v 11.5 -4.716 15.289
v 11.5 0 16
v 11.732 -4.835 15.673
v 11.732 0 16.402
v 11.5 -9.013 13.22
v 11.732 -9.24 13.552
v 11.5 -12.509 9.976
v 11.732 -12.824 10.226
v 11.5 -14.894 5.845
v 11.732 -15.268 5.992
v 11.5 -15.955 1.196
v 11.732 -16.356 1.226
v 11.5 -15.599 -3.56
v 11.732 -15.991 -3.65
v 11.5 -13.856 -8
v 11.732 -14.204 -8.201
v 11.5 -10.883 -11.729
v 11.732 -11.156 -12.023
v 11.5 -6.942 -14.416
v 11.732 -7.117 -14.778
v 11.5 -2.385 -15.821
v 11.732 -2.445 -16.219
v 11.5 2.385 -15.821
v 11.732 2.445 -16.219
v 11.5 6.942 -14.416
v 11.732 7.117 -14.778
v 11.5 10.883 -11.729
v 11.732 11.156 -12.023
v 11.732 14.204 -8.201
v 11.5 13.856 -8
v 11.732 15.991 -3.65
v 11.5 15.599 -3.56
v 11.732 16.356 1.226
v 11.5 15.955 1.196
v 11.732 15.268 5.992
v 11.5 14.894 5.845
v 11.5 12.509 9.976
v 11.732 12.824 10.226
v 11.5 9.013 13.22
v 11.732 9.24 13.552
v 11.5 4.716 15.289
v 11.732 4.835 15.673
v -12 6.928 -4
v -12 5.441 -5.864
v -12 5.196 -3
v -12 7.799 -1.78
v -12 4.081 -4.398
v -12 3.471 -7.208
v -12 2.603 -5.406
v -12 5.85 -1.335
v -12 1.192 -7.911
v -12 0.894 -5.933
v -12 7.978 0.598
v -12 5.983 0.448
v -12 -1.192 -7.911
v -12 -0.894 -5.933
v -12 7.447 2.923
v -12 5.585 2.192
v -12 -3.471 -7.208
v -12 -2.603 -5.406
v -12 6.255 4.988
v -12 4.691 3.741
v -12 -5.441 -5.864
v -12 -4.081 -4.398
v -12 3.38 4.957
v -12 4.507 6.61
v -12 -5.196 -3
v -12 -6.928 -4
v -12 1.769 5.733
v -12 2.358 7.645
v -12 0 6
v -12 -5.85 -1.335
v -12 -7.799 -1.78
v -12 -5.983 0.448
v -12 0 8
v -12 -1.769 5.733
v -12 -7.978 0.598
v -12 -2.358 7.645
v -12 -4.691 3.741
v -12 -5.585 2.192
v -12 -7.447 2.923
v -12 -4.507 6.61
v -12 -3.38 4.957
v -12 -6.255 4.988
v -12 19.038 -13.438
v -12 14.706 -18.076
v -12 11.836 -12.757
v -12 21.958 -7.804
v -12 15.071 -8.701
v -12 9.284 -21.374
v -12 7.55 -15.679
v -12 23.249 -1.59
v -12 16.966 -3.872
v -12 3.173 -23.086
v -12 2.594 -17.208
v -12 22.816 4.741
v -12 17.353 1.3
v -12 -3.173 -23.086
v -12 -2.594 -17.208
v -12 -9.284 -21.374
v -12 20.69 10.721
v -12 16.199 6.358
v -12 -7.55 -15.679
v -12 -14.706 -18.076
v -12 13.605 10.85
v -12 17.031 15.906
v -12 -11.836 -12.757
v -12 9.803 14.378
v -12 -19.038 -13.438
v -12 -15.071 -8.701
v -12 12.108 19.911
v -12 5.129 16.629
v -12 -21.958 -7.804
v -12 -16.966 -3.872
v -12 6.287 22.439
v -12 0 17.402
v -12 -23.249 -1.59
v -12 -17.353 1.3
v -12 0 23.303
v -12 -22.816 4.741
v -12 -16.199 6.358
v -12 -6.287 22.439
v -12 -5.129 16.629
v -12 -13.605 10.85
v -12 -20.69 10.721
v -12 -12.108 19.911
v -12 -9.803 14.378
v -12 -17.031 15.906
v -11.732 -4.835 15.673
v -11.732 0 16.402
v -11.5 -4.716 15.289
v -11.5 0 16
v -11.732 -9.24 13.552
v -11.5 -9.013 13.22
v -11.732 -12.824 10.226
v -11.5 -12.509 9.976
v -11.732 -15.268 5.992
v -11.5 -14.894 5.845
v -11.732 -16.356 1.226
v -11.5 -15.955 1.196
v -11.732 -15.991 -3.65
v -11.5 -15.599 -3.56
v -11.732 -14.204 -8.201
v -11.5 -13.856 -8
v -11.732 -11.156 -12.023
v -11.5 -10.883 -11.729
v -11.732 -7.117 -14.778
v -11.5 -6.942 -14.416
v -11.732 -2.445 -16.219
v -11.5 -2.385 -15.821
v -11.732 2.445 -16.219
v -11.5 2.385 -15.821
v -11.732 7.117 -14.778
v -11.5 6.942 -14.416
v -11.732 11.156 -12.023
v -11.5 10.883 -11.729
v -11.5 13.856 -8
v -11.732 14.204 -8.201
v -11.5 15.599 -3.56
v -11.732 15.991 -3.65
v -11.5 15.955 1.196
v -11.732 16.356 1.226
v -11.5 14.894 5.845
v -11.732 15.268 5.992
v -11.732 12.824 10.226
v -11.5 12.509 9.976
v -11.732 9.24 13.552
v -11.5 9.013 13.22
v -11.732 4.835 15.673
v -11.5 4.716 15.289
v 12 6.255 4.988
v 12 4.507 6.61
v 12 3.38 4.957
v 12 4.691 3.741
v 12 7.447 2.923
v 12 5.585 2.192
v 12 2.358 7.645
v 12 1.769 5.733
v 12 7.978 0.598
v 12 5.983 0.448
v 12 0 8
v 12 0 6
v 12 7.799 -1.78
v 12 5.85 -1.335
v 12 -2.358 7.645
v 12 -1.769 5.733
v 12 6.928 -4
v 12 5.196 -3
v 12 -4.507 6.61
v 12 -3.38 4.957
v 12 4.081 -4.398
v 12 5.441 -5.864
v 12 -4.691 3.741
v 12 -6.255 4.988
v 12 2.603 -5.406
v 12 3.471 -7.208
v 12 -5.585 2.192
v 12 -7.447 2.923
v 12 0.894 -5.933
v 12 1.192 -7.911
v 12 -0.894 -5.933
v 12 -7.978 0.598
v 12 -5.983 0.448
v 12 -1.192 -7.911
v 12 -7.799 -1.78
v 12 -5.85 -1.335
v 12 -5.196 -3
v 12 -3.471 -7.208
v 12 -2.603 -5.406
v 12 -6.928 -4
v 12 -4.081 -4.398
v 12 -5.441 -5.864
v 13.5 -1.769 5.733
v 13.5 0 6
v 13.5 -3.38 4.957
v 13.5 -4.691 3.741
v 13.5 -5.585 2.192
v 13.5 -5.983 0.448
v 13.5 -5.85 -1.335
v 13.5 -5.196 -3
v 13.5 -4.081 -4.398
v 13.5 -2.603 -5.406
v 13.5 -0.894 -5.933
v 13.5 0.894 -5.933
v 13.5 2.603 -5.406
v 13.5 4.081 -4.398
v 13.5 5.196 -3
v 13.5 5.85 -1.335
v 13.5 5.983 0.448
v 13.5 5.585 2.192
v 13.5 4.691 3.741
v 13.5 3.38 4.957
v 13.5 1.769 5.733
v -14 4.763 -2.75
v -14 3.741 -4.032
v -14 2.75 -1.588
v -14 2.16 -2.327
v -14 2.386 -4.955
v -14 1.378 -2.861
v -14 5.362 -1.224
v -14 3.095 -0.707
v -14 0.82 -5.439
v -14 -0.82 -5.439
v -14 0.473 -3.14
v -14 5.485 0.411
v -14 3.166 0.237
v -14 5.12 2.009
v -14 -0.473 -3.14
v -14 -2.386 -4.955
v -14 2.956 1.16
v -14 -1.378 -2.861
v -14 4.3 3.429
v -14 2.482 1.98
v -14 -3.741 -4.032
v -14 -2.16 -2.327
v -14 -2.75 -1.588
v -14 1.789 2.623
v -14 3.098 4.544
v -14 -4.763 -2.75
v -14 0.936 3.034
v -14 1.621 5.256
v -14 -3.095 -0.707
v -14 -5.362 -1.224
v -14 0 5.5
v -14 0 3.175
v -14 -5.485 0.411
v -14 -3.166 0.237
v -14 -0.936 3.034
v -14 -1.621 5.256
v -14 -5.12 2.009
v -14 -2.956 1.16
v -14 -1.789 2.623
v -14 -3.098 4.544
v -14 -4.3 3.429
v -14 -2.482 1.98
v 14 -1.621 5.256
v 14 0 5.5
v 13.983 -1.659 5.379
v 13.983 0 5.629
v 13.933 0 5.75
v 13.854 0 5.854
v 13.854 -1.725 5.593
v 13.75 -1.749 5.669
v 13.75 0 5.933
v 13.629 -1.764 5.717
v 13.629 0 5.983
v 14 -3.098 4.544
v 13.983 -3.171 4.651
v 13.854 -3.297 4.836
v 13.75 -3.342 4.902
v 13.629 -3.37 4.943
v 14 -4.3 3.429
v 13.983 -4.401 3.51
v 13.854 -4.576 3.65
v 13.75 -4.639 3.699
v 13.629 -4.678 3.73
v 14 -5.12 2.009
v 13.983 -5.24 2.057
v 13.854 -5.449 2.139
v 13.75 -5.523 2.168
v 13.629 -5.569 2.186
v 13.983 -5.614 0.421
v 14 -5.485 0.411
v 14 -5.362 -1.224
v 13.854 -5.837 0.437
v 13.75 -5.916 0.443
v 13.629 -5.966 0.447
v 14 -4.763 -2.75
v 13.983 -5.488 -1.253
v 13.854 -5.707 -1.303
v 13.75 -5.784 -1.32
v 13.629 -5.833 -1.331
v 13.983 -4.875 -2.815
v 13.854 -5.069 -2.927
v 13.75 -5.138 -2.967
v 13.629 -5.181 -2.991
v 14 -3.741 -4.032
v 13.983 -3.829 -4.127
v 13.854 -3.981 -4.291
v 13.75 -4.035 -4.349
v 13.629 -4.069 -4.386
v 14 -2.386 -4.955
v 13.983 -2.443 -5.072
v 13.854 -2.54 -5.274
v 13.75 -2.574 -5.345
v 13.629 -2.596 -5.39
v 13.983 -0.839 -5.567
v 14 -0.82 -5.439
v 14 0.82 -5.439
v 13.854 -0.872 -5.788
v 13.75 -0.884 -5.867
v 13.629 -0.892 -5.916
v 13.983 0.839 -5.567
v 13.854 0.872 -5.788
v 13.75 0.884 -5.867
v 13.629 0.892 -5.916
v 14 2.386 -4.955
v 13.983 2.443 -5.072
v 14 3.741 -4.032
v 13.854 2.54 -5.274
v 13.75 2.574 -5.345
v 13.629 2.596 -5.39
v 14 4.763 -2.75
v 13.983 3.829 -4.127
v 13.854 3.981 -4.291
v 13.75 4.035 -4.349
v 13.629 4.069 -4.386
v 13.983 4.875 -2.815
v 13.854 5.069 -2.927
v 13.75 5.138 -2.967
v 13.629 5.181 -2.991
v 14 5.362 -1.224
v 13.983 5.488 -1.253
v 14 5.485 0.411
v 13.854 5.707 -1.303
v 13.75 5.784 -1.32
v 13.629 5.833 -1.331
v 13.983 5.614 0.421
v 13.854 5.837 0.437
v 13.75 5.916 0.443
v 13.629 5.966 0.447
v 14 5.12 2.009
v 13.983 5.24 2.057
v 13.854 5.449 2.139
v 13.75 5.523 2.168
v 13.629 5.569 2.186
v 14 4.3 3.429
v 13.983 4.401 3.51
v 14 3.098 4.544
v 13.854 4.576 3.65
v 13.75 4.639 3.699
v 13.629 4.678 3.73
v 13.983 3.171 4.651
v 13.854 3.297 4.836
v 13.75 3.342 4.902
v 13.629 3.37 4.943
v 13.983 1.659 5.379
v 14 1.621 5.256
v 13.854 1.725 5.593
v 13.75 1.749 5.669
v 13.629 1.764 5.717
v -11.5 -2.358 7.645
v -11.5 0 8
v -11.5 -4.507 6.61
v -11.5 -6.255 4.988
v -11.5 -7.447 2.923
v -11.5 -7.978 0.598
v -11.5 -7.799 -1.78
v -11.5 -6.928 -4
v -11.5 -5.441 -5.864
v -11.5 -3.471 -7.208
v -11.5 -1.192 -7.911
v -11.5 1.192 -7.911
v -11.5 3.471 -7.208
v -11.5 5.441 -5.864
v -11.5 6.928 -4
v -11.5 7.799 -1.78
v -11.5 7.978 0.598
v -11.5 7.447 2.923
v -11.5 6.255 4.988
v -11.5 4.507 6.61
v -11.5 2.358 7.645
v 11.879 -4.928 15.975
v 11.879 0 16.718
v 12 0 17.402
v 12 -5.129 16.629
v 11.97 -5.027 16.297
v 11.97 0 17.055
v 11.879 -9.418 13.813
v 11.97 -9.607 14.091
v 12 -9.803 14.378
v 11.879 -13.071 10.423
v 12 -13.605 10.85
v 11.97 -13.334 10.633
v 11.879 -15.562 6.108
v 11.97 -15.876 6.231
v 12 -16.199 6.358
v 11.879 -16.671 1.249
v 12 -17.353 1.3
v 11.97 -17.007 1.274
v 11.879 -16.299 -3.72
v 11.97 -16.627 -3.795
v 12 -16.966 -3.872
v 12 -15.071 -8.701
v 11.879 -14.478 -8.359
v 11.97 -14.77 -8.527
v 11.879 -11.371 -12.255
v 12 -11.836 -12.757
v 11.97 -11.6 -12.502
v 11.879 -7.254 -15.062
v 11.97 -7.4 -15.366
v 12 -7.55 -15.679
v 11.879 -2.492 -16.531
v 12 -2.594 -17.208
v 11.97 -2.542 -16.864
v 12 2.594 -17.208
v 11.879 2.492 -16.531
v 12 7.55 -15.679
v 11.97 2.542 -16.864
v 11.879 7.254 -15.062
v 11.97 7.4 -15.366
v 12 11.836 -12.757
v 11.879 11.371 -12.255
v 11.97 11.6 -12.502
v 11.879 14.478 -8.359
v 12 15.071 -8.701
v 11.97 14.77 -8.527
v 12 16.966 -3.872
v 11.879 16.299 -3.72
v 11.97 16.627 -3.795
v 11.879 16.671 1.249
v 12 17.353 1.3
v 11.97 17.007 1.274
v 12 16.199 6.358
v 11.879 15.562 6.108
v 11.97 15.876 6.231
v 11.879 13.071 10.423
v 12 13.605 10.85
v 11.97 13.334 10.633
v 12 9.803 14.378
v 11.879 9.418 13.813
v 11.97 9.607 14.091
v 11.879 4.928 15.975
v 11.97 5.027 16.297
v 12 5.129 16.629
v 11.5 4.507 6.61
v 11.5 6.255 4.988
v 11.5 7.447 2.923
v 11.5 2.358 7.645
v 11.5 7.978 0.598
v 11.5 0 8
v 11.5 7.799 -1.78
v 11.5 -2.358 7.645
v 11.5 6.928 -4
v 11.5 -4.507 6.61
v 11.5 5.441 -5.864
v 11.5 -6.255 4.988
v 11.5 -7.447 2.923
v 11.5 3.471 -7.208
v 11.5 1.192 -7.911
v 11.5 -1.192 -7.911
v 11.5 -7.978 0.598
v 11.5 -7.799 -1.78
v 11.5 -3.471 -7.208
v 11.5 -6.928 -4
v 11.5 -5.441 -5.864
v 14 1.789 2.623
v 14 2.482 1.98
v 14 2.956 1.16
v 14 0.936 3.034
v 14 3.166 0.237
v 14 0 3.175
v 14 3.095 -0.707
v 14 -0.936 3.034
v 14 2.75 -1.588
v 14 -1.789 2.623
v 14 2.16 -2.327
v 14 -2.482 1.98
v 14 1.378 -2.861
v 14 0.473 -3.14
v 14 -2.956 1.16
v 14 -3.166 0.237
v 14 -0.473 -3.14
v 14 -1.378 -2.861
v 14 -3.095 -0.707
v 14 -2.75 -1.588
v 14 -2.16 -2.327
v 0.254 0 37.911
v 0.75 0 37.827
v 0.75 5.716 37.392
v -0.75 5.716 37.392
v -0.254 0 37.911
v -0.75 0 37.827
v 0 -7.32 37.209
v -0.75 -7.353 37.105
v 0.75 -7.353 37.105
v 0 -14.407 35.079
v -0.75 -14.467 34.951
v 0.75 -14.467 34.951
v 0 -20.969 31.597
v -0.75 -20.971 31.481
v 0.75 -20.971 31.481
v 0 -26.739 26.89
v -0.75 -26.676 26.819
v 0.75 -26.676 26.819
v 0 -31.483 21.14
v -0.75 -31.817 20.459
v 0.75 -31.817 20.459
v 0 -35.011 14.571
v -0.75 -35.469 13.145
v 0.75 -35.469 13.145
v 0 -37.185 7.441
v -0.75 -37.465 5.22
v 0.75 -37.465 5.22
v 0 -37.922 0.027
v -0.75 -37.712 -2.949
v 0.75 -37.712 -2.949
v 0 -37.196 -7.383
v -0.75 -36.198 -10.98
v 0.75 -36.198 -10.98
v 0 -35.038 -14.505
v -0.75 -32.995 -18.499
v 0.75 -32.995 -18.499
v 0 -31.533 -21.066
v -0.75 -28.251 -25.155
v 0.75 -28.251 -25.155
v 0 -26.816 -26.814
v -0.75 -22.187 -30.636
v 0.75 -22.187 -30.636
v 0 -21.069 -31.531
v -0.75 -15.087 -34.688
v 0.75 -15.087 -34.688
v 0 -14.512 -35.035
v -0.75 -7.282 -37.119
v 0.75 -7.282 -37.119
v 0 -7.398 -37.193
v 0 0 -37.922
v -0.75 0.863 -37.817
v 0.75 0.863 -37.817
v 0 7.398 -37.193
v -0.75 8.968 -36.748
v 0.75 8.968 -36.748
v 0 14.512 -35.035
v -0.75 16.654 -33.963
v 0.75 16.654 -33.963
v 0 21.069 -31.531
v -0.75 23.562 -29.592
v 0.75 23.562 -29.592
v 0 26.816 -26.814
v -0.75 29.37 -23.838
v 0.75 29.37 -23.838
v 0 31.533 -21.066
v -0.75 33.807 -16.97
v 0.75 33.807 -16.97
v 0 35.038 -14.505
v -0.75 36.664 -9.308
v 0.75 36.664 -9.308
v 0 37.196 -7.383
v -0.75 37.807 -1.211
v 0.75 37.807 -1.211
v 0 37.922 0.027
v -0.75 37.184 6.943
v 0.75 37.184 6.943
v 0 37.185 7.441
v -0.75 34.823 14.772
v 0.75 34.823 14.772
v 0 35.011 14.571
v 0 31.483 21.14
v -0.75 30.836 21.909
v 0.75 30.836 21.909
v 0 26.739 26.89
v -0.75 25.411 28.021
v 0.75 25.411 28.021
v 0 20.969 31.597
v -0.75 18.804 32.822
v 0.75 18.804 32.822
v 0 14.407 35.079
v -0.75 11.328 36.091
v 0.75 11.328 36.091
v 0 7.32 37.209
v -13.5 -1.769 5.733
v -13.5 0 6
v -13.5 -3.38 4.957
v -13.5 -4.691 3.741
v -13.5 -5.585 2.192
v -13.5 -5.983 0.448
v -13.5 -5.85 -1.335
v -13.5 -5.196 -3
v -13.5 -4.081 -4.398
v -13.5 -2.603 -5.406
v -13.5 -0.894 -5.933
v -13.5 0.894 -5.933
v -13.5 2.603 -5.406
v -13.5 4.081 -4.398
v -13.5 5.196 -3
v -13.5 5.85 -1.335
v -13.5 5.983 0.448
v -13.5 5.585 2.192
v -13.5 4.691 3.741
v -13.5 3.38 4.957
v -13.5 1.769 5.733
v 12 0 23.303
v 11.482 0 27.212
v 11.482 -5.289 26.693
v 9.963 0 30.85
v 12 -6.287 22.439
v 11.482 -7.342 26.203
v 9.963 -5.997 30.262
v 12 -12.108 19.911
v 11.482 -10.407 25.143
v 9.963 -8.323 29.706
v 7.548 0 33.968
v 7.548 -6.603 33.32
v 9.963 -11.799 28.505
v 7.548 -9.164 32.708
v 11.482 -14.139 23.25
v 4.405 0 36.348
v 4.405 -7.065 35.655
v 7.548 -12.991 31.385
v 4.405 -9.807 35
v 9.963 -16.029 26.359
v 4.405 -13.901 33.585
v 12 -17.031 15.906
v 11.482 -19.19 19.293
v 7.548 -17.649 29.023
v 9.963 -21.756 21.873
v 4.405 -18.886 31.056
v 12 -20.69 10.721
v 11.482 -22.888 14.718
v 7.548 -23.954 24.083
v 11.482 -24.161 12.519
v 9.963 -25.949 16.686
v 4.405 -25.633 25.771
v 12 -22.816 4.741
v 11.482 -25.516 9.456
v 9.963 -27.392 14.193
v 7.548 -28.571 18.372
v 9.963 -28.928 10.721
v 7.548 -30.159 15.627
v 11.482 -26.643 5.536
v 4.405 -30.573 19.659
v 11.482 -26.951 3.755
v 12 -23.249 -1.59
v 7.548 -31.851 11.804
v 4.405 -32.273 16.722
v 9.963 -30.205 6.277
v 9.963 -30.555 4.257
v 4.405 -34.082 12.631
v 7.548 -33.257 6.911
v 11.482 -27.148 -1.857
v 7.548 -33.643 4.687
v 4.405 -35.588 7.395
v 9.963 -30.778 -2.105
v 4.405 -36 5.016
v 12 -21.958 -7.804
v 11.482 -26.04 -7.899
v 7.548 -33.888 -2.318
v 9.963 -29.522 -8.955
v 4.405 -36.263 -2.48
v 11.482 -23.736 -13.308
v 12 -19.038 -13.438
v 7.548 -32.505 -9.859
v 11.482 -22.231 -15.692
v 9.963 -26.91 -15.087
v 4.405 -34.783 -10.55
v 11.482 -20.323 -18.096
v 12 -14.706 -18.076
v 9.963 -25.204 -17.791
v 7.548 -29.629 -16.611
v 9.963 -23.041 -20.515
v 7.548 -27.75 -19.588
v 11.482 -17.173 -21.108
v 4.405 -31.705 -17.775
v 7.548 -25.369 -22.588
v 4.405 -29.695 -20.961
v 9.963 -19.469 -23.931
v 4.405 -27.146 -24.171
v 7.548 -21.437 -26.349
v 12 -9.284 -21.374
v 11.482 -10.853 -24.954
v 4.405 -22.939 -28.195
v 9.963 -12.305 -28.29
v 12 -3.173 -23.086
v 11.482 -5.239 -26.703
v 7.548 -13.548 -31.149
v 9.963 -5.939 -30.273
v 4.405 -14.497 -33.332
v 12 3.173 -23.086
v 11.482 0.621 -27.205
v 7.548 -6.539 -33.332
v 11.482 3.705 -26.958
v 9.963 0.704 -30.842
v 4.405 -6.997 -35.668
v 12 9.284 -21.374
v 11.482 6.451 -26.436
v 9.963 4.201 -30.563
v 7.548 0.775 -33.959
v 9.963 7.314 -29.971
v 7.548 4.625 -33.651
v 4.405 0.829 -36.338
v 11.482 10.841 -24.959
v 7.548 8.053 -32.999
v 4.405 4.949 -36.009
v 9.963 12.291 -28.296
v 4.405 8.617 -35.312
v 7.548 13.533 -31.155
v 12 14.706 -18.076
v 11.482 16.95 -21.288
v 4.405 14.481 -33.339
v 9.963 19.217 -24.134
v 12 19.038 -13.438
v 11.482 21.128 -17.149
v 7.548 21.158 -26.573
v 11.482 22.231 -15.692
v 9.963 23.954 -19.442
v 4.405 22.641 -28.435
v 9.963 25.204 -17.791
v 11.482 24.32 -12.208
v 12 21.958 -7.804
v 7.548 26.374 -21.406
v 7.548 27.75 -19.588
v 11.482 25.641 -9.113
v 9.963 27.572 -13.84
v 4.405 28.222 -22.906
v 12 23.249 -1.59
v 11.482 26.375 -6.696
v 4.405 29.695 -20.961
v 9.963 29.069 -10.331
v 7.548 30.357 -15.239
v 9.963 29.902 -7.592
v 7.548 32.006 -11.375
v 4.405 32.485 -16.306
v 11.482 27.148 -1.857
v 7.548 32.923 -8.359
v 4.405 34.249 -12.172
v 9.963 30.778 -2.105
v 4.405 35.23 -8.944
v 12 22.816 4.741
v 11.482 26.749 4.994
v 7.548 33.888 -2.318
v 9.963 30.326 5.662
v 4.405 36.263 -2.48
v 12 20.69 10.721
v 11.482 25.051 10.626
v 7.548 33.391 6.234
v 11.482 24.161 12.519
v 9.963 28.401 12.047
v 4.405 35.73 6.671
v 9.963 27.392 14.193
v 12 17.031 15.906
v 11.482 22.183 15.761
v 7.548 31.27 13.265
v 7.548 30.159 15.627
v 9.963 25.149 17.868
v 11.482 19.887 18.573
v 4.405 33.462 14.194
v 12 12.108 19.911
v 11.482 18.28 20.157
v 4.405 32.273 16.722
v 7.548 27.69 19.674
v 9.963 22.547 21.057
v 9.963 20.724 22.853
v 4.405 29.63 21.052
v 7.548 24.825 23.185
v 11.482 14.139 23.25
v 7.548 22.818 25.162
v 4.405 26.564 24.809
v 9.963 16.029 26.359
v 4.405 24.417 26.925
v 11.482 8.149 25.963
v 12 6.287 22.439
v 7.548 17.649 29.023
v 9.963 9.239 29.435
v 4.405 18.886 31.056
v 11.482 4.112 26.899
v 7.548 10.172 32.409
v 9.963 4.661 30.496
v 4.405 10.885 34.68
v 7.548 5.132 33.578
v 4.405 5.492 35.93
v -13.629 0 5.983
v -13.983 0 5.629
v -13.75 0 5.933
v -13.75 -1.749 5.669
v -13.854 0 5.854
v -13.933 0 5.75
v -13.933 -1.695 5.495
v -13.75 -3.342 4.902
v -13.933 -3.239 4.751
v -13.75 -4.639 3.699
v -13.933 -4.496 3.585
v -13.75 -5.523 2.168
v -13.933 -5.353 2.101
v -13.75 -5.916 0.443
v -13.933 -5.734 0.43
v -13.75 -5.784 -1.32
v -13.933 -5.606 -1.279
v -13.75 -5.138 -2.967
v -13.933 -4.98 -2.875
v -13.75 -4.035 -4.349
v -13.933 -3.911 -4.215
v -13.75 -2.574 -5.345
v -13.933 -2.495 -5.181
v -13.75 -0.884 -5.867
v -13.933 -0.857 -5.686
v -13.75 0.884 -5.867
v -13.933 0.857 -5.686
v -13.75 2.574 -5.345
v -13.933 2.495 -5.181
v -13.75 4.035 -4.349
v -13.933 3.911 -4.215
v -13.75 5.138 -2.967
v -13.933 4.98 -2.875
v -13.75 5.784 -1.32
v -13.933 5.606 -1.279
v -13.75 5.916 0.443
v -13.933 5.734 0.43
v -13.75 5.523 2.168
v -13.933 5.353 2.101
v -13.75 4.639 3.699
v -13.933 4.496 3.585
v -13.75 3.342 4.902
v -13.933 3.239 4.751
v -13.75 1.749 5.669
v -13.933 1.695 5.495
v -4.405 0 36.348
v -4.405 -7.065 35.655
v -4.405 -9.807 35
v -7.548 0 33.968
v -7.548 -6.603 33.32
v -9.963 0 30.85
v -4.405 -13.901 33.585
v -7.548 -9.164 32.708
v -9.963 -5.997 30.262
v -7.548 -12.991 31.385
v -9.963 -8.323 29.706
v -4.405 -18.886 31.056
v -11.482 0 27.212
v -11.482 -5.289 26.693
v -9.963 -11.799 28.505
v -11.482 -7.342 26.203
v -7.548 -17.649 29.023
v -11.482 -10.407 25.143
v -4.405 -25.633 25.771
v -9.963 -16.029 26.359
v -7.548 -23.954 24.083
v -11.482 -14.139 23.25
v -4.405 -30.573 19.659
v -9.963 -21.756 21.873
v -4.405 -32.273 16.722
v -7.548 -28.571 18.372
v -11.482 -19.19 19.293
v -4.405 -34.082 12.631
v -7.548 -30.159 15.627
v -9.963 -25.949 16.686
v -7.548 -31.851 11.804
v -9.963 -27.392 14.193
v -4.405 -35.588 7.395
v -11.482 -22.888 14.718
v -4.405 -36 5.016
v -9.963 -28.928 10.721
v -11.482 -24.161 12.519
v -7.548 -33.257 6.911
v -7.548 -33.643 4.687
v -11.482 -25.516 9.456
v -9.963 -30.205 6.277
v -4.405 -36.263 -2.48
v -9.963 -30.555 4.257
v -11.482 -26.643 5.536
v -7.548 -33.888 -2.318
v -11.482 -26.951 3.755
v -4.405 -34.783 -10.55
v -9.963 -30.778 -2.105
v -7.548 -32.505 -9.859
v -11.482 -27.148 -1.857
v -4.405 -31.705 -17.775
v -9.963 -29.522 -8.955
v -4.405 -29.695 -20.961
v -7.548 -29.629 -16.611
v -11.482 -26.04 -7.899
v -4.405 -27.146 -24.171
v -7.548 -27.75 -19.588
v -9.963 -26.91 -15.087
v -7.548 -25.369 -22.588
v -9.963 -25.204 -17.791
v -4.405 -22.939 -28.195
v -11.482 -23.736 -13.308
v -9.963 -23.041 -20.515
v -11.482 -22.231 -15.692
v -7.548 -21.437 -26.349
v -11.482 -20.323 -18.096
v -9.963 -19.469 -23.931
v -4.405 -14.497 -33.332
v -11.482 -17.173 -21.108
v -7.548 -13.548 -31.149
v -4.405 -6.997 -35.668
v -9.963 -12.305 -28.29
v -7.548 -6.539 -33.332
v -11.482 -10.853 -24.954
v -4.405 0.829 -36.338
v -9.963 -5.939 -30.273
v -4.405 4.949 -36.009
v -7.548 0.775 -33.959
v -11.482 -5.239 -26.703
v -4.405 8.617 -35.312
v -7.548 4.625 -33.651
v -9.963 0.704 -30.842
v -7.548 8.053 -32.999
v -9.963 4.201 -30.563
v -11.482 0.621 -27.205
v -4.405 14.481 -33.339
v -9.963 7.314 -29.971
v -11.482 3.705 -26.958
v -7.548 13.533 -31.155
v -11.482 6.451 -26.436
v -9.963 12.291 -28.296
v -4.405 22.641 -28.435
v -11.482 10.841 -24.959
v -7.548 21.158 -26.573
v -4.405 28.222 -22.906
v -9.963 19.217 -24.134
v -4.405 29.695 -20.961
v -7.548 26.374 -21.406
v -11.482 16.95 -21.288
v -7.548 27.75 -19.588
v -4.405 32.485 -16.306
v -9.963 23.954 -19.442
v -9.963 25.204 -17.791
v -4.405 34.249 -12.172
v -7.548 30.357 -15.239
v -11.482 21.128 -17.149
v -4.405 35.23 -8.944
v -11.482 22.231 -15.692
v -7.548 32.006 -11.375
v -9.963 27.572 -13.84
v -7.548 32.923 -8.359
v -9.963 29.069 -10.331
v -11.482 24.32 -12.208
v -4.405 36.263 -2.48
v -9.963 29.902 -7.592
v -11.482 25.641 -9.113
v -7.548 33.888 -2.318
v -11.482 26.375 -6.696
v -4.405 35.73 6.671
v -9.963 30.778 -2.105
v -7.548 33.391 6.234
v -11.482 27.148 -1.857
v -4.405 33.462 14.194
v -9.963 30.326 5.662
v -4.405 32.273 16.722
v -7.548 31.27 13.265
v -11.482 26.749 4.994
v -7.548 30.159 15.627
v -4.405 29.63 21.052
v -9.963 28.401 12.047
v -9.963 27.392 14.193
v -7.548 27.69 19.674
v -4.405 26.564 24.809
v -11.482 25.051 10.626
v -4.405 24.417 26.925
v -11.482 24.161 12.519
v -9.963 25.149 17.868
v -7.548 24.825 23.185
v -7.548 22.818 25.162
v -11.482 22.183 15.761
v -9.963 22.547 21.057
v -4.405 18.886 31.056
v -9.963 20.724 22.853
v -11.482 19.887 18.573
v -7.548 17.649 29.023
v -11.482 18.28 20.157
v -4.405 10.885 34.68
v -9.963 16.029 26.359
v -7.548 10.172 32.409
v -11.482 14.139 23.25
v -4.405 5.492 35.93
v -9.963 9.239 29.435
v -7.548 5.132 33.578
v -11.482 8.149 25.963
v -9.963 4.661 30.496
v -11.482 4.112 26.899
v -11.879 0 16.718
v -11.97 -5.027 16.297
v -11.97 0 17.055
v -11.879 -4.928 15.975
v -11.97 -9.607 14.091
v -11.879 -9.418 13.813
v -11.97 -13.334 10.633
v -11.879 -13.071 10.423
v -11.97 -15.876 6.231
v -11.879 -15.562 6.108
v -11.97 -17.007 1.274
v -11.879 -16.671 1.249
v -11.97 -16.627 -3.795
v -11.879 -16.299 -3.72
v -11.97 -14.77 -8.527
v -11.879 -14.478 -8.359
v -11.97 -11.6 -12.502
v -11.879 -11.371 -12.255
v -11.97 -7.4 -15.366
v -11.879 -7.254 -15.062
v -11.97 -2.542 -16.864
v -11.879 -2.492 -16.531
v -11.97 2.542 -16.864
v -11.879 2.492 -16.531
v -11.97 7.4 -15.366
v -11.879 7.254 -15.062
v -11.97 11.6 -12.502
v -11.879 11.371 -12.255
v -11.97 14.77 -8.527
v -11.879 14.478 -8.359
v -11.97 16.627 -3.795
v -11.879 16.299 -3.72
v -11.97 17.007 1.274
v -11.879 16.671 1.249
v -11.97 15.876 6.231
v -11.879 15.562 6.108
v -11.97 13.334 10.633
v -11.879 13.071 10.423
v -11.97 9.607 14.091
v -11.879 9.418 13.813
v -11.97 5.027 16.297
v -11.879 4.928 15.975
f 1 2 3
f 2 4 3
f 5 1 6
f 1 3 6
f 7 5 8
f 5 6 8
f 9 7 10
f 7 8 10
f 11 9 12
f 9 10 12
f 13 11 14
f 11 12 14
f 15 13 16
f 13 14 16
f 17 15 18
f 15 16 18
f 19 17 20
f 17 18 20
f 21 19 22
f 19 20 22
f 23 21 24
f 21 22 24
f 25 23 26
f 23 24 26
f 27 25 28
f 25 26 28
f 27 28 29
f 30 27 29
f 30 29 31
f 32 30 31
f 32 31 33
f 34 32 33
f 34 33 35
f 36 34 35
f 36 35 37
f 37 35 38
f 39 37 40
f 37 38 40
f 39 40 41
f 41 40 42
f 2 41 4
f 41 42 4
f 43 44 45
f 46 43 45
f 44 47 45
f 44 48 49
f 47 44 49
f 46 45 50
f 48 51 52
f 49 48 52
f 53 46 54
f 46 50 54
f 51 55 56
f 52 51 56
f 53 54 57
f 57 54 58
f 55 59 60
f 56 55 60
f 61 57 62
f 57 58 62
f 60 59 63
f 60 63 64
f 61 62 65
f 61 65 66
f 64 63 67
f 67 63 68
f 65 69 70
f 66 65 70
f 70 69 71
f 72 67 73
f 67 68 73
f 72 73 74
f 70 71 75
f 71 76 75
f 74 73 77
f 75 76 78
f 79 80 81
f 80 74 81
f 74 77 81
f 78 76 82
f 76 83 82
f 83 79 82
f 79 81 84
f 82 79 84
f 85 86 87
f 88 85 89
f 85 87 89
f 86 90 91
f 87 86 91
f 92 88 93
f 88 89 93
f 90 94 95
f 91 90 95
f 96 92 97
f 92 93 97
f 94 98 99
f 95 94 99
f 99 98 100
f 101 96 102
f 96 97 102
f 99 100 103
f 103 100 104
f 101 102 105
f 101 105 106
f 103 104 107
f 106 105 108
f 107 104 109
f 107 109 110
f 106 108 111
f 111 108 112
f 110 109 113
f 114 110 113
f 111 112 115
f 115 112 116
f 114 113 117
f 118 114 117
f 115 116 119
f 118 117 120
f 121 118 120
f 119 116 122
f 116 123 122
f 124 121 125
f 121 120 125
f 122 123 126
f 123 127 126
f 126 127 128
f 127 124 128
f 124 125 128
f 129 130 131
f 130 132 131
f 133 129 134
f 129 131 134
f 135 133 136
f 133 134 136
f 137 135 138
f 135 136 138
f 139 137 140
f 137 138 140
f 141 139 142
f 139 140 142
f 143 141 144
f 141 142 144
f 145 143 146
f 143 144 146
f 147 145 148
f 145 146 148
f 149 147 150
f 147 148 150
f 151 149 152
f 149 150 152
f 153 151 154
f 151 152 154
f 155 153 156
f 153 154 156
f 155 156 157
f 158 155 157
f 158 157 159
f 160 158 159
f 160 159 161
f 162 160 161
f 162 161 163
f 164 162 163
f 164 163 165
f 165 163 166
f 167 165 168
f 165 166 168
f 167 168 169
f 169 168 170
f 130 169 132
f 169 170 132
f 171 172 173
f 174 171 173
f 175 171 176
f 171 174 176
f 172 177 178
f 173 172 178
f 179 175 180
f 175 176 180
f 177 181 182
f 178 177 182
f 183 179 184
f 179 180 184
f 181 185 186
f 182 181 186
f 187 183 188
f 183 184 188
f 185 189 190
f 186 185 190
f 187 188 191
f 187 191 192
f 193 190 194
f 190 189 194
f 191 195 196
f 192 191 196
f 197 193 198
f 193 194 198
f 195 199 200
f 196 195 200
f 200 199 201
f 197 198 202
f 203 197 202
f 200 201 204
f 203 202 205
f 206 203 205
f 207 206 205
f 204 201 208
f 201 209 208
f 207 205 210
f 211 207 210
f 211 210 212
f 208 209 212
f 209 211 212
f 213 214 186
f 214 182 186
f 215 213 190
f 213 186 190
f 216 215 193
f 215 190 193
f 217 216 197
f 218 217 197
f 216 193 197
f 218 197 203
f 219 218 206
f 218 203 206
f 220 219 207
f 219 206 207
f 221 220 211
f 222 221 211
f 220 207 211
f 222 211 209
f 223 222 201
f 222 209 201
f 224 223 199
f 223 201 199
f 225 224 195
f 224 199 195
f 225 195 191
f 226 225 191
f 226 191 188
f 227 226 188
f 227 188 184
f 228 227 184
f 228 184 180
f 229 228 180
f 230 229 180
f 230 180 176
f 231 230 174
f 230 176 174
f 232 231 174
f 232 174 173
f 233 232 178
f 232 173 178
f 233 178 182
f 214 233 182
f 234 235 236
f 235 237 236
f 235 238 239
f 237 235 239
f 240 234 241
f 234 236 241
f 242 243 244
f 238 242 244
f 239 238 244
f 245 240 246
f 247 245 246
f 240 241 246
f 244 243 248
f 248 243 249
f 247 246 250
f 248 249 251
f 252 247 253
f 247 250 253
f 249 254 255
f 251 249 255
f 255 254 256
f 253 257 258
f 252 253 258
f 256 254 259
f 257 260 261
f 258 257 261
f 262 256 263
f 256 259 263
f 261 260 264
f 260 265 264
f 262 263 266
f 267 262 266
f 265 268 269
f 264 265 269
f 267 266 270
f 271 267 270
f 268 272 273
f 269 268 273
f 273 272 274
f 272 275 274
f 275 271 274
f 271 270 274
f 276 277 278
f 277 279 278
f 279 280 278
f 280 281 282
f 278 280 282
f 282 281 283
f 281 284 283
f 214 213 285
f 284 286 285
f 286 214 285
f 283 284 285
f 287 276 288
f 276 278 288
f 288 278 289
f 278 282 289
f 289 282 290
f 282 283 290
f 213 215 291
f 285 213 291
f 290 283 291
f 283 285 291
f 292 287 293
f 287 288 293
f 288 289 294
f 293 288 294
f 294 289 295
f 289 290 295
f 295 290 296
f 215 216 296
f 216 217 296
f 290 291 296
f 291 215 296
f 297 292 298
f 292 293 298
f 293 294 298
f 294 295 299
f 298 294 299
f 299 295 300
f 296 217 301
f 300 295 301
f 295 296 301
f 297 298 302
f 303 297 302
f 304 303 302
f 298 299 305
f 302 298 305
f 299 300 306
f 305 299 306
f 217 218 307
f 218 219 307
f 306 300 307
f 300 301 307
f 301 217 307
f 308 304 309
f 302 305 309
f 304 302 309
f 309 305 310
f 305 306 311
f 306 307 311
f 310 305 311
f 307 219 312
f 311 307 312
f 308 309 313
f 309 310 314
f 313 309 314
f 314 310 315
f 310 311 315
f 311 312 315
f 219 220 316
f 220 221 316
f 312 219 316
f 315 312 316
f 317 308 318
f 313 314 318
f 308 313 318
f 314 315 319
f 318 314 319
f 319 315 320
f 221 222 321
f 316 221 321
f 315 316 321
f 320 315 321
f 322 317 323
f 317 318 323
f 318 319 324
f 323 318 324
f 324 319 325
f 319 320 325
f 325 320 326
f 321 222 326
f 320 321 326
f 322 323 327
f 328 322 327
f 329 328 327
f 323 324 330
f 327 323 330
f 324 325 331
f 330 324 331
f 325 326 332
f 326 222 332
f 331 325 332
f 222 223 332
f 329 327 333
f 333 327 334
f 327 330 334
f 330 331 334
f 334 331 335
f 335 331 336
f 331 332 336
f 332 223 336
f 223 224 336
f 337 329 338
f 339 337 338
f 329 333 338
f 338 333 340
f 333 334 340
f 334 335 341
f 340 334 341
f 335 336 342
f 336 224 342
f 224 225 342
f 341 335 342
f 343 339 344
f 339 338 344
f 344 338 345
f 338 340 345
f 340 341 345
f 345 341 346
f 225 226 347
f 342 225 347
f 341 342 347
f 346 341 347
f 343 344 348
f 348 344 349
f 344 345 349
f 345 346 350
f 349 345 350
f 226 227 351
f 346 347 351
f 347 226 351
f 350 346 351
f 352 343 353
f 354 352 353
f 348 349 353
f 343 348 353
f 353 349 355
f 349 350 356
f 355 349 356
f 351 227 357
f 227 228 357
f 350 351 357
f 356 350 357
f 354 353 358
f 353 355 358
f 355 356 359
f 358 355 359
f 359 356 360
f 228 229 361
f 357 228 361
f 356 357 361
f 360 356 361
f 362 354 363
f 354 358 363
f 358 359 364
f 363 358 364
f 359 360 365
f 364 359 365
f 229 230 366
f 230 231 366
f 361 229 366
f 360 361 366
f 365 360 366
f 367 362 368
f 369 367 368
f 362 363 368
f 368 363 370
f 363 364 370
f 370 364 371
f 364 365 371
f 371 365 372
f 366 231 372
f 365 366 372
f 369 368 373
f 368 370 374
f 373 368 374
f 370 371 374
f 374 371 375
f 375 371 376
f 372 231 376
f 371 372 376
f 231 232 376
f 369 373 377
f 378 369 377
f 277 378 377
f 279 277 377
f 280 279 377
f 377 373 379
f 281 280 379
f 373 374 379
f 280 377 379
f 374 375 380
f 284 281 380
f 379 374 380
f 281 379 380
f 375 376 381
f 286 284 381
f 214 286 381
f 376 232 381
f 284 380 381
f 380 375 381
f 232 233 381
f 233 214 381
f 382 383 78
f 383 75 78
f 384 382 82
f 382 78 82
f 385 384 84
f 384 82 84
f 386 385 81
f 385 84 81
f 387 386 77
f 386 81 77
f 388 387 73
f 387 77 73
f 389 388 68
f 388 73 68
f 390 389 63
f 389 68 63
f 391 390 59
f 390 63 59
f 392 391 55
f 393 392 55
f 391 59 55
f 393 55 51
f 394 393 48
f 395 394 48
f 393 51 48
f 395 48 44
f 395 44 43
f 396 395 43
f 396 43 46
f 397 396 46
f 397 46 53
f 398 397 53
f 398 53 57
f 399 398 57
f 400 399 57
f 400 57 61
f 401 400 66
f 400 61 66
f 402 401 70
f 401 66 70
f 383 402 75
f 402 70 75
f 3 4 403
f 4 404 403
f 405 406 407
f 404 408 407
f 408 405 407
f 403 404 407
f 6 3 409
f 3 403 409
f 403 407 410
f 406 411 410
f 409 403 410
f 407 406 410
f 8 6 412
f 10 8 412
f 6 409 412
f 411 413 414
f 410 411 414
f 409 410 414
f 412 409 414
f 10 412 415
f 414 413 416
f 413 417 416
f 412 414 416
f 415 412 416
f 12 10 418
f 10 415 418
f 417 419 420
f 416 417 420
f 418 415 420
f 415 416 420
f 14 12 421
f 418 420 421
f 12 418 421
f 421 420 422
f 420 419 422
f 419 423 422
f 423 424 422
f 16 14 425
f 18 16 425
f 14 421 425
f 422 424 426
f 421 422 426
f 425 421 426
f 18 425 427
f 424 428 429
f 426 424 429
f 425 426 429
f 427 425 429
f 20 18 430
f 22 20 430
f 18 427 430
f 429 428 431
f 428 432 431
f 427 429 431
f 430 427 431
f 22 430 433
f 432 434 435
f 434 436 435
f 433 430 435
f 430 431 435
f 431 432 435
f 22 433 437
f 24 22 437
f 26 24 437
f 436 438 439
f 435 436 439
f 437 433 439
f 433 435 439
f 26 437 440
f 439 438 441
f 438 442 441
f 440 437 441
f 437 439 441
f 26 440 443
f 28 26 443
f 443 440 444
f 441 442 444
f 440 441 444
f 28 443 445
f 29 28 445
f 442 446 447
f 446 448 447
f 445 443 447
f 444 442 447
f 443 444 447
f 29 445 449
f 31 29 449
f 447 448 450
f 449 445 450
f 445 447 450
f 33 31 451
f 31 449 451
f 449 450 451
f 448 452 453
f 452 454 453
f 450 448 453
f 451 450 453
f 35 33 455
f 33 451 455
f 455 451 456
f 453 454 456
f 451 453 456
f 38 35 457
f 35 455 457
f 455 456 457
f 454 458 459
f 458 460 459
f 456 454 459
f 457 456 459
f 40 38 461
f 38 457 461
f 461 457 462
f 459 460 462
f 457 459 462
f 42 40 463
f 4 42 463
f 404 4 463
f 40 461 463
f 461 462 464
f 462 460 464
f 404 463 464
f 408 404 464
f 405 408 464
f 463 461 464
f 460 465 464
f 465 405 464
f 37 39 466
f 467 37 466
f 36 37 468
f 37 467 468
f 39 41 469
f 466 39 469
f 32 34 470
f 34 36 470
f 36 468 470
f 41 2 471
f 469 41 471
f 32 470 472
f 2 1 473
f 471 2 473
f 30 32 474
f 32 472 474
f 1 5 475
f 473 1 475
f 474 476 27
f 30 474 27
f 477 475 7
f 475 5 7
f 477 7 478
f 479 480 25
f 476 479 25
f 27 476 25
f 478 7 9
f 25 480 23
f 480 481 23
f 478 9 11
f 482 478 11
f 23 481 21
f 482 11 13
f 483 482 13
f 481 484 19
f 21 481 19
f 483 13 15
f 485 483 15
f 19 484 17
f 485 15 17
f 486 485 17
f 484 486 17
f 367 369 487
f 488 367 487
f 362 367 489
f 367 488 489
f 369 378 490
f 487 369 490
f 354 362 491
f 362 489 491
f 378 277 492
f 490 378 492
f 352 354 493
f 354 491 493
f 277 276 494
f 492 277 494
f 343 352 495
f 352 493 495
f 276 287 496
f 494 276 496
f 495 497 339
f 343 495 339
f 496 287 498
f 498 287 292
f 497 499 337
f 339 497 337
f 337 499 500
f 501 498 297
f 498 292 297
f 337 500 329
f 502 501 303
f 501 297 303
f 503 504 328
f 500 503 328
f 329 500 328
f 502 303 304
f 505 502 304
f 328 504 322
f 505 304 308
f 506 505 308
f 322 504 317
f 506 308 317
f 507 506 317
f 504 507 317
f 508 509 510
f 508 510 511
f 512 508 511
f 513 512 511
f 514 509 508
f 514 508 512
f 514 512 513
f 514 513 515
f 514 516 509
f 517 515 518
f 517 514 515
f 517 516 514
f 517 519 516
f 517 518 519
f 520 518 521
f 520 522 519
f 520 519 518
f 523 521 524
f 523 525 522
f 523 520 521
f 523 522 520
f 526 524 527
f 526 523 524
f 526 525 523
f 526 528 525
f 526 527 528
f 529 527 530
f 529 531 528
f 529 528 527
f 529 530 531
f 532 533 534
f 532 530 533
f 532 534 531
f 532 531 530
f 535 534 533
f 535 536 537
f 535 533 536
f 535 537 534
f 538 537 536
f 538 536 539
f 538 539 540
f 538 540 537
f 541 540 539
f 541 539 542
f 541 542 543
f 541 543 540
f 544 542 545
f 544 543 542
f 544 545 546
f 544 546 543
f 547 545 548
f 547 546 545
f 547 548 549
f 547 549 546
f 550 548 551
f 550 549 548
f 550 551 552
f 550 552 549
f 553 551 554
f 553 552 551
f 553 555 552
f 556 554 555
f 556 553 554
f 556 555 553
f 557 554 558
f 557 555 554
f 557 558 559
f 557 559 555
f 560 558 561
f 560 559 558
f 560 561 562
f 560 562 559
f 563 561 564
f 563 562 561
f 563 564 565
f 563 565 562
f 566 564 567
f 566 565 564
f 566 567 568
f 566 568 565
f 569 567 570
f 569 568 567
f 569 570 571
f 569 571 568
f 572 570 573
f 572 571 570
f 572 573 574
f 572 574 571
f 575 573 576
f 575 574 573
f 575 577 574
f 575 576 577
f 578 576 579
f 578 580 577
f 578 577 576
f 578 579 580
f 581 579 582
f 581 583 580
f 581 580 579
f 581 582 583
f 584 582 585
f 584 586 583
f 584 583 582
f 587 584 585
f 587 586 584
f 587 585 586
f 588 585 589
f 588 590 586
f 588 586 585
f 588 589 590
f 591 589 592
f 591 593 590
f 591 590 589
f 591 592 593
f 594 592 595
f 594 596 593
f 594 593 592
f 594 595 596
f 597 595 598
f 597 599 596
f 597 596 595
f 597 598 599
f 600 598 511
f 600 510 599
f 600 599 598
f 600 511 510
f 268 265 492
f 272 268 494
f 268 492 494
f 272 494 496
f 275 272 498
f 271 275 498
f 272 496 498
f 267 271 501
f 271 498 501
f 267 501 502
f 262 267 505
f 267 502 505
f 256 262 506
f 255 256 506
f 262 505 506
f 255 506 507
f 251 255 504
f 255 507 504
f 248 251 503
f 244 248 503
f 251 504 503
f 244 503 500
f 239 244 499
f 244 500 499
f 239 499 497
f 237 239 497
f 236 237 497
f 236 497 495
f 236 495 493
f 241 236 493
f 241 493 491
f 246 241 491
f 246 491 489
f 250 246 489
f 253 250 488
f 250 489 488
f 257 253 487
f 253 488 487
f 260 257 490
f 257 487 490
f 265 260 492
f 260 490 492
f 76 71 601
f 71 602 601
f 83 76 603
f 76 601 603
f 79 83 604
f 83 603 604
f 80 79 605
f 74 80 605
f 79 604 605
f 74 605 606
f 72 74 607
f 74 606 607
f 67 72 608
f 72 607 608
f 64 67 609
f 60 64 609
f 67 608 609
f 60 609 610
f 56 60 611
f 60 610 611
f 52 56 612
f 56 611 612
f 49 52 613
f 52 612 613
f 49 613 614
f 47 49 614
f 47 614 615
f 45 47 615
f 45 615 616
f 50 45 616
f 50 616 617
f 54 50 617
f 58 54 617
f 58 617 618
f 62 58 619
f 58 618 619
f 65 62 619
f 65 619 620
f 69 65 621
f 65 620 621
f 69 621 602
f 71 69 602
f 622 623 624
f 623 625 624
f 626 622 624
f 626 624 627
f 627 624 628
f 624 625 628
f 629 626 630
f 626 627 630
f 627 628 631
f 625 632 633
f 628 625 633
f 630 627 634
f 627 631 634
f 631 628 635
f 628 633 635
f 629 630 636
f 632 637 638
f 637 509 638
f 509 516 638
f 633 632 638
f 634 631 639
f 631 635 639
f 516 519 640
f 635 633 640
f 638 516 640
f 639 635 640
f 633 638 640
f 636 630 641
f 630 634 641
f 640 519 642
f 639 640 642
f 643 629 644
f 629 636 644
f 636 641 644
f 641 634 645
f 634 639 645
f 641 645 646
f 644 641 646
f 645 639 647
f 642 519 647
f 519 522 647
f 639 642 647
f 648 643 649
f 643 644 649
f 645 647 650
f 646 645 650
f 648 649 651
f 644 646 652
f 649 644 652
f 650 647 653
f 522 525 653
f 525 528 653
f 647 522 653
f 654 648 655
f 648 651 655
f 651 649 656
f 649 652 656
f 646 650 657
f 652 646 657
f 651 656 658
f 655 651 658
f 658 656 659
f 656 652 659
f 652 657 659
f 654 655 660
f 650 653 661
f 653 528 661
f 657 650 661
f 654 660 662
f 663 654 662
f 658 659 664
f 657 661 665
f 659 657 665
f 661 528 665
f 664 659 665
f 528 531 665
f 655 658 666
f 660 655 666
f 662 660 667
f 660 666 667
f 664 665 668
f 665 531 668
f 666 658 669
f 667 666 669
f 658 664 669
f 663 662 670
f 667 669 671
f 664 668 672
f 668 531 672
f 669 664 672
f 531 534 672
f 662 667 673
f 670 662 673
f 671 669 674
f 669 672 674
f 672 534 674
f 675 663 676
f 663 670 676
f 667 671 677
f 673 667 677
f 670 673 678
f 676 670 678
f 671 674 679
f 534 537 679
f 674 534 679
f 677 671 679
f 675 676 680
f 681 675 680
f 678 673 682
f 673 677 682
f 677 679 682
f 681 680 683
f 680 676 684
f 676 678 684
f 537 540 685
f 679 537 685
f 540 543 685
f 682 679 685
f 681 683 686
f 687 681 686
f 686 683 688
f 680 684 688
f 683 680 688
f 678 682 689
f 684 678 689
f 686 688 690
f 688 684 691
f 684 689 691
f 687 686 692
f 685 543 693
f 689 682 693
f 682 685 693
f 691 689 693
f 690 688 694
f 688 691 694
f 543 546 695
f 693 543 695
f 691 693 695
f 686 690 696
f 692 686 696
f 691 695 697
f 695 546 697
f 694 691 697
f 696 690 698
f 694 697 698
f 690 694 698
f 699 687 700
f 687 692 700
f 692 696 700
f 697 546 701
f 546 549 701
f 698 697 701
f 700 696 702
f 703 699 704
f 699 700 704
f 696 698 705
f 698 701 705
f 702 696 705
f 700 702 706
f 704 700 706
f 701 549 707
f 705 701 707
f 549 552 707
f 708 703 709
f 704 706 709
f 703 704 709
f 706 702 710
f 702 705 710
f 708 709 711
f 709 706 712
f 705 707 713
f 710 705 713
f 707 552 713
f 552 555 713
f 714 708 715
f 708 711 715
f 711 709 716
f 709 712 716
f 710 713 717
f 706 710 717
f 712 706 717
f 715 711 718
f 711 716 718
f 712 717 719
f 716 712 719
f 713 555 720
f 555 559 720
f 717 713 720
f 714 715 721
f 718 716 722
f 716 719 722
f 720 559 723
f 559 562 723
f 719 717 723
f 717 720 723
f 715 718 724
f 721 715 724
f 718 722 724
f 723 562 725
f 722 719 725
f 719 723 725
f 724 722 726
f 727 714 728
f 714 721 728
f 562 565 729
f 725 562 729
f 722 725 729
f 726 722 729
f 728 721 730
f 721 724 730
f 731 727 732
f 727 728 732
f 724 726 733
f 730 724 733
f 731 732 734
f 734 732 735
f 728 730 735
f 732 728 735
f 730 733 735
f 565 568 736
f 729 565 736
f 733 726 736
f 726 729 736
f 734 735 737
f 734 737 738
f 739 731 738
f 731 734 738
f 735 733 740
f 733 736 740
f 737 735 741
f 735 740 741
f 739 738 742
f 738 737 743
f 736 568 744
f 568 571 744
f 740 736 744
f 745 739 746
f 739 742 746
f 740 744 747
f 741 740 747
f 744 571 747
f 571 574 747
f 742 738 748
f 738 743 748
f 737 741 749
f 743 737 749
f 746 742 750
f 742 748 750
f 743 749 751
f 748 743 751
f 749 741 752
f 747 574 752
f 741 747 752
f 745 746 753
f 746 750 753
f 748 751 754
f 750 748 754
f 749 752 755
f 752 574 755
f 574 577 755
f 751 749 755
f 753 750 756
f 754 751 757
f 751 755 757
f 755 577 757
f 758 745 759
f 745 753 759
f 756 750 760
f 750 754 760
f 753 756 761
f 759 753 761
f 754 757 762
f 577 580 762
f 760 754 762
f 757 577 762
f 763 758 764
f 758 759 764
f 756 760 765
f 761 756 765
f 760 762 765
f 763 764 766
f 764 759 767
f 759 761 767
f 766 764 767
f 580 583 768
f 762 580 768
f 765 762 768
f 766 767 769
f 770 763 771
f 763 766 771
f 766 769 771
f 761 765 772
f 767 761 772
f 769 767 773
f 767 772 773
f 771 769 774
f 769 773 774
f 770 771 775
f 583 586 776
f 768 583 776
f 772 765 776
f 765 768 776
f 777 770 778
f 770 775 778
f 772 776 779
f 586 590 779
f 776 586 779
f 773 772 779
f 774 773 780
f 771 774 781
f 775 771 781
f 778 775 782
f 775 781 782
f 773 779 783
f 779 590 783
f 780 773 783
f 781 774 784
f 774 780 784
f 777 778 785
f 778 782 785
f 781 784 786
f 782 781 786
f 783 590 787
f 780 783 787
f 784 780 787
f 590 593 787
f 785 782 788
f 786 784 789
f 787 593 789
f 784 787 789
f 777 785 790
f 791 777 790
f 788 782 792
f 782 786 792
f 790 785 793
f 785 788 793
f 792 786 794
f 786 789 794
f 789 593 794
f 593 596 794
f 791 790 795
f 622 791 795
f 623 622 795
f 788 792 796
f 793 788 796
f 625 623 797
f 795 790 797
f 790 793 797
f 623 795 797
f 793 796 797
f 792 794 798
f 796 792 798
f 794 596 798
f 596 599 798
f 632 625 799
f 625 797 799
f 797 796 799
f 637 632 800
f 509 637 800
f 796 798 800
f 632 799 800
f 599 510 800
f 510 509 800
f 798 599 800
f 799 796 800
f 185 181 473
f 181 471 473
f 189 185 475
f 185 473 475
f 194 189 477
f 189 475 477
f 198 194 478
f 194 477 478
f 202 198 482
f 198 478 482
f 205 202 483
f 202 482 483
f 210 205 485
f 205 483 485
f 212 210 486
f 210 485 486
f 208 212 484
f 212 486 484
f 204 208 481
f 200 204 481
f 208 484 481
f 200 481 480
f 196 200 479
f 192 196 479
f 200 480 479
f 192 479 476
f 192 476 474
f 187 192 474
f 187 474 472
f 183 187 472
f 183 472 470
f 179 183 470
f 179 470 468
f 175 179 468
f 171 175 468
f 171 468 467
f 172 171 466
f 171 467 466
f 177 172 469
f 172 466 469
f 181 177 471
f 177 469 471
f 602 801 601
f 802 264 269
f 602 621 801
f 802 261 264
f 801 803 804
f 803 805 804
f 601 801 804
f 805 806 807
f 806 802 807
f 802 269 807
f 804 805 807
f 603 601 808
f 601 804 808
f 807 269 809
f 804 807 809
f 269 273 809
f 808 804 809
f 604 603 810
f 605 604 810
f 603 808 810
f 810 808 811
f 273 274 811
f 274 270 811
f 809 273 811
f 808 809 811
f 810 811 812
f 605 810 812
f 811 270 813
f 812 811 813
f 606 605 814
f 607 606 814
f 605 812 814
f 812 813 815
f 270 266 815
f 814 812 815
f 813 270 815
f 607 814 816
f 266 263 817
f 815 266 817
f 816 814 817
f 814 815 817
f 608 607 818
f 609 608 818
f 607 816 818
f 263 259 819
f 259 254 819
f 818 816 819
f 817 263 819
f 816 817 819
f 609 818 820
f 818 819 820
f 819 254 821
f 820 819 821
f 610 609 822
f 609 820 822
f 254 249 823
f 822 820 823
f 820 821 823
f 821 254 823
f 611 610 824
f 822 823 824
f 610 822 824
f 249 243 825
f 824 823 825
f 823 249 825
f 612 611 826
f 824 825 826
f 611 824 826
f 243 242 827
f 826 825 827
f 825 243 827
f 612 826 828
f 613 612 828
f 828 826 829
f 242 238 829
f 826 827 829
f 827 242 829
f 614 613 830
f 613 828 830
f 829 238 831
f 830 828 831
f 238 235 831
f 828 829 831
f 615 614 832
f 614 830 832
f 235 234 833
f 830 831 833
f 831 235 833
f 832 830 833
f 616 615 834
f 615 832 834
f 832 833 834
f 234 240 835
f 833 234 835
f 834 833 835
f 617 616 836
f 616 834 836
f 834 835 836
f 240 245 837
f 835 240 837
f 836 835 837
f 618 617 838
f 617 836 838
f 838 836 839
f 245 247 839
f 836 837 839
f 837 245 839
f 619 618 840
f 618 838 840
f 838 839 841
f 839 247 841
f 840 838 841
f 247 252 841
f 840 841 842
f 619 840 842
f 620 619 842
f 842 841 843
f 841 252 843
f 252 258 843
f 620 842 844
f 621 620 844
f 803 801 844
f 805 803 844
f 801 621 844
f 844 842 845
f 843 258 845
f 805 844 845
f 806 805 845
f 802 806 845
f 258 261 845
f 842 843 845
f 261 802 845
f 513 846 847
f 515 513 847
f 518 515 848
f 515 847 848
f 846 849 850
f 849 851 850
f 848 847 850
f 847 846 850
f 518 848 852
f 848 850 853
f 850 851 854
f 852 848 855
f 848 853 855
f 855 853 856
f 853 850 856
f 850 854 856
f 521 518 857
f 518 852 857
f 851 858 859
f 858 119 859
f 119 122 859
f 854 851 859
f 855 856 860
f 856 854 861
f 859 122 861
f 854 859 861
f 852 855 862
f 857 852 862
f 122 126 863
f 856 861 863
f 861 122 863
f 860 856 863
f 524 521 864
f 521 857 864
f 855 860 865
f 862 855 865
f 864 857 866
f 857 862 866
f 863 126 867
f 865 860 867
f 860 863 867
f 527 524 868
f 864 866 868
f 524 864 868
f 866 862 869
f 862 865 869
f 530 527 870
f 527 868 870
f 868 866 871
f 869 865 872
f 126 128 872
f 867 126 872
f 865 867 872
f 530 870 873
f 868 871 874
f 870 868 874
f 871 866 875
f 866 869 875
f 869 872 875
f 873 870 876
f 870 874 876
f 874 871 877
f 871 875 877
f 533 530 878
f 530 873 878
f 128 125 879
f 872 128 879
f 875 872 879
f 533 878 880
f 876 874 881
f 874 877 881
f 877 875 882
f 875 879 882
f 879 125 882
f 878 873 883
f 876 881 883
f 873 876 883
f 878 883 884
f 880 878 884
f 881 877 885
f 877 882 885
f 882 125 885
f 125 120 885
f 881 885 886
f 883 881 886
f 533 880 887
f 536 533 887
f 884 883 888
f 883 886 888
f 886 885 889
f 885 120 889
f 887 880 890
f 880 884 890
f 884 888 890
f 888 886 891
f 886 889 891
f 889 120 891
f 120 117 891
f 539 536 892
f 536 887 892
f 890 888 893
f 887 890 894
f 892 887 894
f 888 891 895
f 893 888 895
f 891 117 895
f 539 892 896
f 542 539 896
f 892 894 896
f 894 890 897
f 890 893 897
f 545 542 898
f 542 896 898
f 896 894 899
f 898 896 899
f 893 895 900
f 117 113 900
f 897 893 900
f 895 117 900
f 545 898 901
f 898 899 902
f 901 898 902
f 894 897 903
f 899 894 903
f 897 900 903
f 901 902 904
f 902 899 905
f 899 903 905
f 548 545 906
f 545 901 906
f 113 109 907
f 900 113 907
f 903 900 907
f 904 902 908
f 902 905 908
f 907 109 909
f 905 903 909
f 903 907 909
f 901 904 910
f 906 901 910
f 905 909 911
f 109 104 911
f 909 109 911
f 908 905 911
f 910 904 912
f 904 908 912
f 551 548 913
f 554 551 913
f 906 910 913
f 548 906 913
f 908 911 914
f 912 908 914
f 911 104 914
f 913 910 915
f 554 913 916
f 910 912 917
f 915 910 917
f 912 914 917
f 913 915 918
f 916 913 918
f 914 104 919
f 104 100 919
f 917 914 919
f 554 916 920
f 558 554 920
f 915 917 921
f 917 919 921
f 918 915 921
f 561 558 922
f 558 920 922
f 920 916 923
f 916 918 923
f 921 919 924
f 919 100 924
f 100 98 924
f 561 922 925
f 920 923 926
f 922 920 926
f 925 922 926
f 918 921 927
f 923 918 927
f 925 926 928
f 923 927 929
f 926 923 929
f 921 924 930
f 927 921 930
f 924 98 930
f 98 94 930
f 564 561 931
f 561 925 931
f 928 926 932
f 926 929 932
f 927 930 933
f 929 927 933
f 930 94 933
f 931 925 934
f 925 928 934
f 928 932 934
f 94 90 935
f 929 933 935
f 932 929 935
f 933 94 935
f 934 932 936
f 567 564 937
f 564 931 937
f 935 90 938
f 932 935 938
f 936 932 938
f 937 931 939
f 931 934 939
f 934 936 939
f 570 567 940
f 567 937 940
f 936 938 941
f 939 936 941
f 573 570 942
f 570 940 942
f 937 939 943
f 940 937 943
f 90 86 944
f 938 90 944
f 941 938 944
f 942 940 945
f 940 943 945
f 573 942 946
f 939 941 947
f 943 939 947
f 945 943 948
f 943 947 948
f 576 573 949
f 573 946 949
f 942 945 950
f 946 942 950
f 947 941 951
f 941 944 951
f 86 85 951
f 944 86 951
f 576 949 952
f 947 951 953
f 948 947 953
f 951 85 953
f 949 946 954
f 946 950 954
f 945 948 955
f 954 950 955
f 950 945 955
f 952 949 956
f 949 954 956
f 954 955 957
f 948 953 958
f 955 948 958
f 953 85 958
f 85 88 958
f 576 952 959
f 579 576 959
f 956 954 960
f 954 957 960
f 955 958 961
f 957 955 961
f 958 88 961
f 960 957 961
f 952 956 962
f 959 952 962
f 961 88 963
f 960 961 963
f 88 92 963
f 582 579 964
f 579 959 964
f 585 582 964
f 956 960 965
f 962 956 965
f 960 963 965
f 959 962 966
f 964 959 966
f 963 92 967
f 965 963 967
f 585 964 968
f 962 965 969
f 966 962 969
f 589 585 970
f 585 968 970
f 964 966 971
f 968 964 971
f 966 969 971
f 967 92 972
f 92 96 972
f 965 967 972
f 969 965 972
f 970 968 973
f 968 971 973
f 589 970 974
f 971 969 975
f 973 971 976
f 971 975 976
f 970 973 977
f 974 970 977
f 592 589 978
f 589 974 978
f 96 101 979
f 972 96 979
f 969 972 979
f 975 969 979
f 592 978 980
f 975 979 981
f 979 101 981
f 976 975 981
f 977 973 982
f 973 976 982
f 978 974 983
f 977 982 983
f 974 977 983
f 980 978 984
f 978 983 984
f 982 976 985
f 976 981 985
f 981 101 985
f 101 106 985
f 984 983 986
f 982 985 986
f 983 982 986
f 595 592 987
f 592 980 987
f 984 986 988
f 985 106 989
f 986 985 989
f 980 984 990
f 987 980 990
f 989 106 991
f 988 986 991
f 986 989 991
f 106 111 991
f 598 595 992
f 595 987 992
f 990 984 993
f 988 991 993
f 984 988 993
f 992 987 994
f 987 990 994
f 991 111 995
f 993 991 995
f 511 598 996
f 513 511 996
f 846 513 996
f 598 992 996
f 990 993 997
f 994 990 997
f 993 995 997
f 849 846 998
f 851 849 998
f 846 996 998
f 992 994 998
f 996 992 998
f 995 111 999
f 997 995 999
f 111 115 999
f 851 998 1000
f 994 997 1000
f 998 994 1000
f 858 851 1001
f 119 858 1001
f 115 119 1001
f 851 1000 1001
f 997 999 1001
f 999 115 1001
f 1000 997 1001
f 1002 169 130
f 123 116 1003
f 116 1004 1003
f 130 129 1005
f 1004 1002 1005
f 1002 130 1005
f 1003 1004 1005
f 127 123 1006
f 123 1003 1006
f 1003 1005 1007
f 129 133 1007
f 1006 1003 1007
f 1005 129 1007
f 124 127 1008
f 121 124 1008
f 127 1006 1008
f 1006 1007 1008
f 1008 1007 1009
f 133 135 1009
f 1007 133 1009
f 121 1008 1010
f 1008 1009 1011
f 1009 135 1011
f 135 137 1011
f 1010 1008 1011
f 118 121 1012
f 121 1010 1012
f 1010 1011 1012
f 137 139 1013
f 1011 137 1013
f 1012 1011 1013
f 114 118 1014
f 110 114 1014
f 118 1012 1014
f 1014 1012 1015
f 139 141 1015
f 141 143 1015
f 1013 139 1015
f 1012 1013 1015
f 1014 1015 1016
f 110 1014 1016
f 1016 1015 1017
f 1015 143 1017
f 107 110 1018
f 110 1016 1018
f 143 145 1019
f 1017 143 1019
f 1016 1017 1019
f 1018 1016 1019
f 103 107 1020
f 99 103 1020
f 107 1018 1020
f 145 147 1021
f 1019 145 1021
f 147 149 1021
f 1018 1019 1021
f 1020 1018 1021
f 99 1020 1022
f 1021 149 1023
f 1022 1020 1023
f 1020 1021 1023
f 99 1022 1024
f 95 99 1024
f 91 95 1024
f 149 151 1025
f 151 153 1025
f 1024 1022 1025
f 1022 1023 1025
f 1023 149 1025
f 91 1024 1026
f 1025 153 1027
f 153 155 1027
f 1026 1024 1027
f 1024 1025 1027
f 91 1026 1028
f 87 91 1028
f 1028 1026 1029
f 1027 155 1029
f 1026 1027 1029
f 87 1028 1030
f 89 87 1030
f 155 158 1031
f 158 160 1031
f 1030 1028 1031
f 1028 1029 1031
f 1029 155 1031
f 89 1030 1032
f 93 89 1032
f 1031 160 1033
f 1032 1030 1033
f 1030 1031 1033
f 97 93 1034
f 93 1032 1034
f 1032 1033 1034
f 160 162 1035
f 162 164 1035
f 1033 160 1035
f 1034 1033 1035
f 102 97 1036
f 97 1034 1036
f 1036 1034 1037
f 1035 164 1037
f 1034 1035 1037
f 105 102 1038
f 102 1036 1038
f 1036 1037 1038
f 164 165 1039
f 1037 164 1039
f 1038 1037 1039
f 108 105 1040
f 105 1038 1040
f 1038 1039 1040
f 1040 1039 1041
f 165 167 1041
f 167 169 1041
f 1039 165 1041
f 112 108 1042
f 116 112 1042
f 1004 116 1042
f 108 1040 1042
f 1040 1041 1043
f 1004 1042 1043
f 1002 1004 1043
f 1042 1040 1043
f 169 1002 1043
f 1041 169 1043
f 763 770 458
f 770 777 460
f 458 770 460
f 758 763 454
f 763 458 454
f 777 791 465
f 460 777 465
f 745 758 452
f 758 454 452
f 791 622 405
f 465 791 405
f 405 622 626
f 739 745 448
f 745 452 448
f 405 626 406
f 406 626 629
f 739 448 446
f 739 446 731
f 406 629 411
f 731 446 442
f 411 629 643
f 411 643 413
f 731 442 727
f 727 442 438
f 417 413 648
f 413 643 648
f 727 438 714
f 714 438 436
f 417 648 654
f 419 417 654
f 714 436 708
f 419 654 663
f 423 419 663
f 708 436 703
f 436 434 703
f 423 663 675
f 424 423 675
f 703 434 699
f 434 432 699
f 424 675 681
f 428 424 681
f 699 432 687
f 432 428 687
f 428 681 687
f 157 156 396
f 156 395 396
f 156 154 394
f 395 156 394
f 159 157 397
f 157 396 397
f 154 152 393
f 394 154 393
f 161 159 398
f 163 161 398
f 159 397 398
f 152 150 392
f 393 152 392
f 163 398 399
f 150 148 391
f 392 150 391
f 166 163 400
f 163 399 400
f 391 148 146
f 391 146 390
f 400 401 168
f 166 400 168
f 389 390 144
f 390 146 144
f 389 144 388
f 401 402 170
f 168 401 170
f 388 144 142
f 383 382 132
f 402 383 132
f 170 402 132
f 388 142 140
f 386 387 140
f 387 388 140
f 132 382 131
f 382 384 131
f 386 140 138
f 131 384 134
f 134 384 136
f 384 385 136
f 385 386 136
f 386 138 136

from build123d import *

# Parameters (mm, degrees)
F2_R = 3


with BuildPart() as f1:
    # F0 (on Front) → F1 (revolve)
    with BuildSketch(Plane.XZ):
        with BuildLine():
            Line((-14, 3.175), (0, 3.175))
            Line((0, 3.175), (14, 3.175))
            Line((14, 3.175), (14, 5.5))
            ThreePointArc((14, 5.5), (13.853553, 5.853553), (13.5, 6))
            Line((13.5, 6), (12, 6))
            Line((12, 6), (12, 8))
            Line((12, 8), (11.5, 8))
            Line((11.5, 8), (11.5, 16))
            Line((11.5, 16), (11.732051, 16.401924))
            ThreePointArc((11.732051, 16.401924), (11.931852, 16.884286), (12, 17.401924))
            Line((12, 17.401924), (12, 23.303062))
            ThreePointArc((12, 23.303062), (8.61895, 32.789895), (0, 38))
            ThreePointArc((0, 38), (-8.61895, 32.789895), (-12, 23.303062))
            Line((-12, 23.303062), (-12, 17.401924))
            ThreePointArc((-12, 17.401924), (-11.931852, 16.884286), (-11.732051, 16.401924))
            Line((-11.732051, 16.401924), (-11.5, 16))
            Line((-11.5, 16), (-11.5, 8))
            Line((-11.5, 8), (-12, 8))
            Line((-12, 8), (-12, 6))
            Line((-12, 6), (-13.5, 6))
            ThreePointArc((-13.5, 6), (-13.853553, 5.853553), (-14, 5.5))
            Line((-14, 5.5), (-14, 3.175))
        make_face()
    revolve(axis=Axis((0, 0, 0), (1, 0, 0)))

    # F2
    f2_edges = [f1.edges().sort_by_distance(p)[0] for p in [
        (0, 0, -38),
    ]]
    fillet(f2_edges, radius=F2_R)


solid = f1.part
